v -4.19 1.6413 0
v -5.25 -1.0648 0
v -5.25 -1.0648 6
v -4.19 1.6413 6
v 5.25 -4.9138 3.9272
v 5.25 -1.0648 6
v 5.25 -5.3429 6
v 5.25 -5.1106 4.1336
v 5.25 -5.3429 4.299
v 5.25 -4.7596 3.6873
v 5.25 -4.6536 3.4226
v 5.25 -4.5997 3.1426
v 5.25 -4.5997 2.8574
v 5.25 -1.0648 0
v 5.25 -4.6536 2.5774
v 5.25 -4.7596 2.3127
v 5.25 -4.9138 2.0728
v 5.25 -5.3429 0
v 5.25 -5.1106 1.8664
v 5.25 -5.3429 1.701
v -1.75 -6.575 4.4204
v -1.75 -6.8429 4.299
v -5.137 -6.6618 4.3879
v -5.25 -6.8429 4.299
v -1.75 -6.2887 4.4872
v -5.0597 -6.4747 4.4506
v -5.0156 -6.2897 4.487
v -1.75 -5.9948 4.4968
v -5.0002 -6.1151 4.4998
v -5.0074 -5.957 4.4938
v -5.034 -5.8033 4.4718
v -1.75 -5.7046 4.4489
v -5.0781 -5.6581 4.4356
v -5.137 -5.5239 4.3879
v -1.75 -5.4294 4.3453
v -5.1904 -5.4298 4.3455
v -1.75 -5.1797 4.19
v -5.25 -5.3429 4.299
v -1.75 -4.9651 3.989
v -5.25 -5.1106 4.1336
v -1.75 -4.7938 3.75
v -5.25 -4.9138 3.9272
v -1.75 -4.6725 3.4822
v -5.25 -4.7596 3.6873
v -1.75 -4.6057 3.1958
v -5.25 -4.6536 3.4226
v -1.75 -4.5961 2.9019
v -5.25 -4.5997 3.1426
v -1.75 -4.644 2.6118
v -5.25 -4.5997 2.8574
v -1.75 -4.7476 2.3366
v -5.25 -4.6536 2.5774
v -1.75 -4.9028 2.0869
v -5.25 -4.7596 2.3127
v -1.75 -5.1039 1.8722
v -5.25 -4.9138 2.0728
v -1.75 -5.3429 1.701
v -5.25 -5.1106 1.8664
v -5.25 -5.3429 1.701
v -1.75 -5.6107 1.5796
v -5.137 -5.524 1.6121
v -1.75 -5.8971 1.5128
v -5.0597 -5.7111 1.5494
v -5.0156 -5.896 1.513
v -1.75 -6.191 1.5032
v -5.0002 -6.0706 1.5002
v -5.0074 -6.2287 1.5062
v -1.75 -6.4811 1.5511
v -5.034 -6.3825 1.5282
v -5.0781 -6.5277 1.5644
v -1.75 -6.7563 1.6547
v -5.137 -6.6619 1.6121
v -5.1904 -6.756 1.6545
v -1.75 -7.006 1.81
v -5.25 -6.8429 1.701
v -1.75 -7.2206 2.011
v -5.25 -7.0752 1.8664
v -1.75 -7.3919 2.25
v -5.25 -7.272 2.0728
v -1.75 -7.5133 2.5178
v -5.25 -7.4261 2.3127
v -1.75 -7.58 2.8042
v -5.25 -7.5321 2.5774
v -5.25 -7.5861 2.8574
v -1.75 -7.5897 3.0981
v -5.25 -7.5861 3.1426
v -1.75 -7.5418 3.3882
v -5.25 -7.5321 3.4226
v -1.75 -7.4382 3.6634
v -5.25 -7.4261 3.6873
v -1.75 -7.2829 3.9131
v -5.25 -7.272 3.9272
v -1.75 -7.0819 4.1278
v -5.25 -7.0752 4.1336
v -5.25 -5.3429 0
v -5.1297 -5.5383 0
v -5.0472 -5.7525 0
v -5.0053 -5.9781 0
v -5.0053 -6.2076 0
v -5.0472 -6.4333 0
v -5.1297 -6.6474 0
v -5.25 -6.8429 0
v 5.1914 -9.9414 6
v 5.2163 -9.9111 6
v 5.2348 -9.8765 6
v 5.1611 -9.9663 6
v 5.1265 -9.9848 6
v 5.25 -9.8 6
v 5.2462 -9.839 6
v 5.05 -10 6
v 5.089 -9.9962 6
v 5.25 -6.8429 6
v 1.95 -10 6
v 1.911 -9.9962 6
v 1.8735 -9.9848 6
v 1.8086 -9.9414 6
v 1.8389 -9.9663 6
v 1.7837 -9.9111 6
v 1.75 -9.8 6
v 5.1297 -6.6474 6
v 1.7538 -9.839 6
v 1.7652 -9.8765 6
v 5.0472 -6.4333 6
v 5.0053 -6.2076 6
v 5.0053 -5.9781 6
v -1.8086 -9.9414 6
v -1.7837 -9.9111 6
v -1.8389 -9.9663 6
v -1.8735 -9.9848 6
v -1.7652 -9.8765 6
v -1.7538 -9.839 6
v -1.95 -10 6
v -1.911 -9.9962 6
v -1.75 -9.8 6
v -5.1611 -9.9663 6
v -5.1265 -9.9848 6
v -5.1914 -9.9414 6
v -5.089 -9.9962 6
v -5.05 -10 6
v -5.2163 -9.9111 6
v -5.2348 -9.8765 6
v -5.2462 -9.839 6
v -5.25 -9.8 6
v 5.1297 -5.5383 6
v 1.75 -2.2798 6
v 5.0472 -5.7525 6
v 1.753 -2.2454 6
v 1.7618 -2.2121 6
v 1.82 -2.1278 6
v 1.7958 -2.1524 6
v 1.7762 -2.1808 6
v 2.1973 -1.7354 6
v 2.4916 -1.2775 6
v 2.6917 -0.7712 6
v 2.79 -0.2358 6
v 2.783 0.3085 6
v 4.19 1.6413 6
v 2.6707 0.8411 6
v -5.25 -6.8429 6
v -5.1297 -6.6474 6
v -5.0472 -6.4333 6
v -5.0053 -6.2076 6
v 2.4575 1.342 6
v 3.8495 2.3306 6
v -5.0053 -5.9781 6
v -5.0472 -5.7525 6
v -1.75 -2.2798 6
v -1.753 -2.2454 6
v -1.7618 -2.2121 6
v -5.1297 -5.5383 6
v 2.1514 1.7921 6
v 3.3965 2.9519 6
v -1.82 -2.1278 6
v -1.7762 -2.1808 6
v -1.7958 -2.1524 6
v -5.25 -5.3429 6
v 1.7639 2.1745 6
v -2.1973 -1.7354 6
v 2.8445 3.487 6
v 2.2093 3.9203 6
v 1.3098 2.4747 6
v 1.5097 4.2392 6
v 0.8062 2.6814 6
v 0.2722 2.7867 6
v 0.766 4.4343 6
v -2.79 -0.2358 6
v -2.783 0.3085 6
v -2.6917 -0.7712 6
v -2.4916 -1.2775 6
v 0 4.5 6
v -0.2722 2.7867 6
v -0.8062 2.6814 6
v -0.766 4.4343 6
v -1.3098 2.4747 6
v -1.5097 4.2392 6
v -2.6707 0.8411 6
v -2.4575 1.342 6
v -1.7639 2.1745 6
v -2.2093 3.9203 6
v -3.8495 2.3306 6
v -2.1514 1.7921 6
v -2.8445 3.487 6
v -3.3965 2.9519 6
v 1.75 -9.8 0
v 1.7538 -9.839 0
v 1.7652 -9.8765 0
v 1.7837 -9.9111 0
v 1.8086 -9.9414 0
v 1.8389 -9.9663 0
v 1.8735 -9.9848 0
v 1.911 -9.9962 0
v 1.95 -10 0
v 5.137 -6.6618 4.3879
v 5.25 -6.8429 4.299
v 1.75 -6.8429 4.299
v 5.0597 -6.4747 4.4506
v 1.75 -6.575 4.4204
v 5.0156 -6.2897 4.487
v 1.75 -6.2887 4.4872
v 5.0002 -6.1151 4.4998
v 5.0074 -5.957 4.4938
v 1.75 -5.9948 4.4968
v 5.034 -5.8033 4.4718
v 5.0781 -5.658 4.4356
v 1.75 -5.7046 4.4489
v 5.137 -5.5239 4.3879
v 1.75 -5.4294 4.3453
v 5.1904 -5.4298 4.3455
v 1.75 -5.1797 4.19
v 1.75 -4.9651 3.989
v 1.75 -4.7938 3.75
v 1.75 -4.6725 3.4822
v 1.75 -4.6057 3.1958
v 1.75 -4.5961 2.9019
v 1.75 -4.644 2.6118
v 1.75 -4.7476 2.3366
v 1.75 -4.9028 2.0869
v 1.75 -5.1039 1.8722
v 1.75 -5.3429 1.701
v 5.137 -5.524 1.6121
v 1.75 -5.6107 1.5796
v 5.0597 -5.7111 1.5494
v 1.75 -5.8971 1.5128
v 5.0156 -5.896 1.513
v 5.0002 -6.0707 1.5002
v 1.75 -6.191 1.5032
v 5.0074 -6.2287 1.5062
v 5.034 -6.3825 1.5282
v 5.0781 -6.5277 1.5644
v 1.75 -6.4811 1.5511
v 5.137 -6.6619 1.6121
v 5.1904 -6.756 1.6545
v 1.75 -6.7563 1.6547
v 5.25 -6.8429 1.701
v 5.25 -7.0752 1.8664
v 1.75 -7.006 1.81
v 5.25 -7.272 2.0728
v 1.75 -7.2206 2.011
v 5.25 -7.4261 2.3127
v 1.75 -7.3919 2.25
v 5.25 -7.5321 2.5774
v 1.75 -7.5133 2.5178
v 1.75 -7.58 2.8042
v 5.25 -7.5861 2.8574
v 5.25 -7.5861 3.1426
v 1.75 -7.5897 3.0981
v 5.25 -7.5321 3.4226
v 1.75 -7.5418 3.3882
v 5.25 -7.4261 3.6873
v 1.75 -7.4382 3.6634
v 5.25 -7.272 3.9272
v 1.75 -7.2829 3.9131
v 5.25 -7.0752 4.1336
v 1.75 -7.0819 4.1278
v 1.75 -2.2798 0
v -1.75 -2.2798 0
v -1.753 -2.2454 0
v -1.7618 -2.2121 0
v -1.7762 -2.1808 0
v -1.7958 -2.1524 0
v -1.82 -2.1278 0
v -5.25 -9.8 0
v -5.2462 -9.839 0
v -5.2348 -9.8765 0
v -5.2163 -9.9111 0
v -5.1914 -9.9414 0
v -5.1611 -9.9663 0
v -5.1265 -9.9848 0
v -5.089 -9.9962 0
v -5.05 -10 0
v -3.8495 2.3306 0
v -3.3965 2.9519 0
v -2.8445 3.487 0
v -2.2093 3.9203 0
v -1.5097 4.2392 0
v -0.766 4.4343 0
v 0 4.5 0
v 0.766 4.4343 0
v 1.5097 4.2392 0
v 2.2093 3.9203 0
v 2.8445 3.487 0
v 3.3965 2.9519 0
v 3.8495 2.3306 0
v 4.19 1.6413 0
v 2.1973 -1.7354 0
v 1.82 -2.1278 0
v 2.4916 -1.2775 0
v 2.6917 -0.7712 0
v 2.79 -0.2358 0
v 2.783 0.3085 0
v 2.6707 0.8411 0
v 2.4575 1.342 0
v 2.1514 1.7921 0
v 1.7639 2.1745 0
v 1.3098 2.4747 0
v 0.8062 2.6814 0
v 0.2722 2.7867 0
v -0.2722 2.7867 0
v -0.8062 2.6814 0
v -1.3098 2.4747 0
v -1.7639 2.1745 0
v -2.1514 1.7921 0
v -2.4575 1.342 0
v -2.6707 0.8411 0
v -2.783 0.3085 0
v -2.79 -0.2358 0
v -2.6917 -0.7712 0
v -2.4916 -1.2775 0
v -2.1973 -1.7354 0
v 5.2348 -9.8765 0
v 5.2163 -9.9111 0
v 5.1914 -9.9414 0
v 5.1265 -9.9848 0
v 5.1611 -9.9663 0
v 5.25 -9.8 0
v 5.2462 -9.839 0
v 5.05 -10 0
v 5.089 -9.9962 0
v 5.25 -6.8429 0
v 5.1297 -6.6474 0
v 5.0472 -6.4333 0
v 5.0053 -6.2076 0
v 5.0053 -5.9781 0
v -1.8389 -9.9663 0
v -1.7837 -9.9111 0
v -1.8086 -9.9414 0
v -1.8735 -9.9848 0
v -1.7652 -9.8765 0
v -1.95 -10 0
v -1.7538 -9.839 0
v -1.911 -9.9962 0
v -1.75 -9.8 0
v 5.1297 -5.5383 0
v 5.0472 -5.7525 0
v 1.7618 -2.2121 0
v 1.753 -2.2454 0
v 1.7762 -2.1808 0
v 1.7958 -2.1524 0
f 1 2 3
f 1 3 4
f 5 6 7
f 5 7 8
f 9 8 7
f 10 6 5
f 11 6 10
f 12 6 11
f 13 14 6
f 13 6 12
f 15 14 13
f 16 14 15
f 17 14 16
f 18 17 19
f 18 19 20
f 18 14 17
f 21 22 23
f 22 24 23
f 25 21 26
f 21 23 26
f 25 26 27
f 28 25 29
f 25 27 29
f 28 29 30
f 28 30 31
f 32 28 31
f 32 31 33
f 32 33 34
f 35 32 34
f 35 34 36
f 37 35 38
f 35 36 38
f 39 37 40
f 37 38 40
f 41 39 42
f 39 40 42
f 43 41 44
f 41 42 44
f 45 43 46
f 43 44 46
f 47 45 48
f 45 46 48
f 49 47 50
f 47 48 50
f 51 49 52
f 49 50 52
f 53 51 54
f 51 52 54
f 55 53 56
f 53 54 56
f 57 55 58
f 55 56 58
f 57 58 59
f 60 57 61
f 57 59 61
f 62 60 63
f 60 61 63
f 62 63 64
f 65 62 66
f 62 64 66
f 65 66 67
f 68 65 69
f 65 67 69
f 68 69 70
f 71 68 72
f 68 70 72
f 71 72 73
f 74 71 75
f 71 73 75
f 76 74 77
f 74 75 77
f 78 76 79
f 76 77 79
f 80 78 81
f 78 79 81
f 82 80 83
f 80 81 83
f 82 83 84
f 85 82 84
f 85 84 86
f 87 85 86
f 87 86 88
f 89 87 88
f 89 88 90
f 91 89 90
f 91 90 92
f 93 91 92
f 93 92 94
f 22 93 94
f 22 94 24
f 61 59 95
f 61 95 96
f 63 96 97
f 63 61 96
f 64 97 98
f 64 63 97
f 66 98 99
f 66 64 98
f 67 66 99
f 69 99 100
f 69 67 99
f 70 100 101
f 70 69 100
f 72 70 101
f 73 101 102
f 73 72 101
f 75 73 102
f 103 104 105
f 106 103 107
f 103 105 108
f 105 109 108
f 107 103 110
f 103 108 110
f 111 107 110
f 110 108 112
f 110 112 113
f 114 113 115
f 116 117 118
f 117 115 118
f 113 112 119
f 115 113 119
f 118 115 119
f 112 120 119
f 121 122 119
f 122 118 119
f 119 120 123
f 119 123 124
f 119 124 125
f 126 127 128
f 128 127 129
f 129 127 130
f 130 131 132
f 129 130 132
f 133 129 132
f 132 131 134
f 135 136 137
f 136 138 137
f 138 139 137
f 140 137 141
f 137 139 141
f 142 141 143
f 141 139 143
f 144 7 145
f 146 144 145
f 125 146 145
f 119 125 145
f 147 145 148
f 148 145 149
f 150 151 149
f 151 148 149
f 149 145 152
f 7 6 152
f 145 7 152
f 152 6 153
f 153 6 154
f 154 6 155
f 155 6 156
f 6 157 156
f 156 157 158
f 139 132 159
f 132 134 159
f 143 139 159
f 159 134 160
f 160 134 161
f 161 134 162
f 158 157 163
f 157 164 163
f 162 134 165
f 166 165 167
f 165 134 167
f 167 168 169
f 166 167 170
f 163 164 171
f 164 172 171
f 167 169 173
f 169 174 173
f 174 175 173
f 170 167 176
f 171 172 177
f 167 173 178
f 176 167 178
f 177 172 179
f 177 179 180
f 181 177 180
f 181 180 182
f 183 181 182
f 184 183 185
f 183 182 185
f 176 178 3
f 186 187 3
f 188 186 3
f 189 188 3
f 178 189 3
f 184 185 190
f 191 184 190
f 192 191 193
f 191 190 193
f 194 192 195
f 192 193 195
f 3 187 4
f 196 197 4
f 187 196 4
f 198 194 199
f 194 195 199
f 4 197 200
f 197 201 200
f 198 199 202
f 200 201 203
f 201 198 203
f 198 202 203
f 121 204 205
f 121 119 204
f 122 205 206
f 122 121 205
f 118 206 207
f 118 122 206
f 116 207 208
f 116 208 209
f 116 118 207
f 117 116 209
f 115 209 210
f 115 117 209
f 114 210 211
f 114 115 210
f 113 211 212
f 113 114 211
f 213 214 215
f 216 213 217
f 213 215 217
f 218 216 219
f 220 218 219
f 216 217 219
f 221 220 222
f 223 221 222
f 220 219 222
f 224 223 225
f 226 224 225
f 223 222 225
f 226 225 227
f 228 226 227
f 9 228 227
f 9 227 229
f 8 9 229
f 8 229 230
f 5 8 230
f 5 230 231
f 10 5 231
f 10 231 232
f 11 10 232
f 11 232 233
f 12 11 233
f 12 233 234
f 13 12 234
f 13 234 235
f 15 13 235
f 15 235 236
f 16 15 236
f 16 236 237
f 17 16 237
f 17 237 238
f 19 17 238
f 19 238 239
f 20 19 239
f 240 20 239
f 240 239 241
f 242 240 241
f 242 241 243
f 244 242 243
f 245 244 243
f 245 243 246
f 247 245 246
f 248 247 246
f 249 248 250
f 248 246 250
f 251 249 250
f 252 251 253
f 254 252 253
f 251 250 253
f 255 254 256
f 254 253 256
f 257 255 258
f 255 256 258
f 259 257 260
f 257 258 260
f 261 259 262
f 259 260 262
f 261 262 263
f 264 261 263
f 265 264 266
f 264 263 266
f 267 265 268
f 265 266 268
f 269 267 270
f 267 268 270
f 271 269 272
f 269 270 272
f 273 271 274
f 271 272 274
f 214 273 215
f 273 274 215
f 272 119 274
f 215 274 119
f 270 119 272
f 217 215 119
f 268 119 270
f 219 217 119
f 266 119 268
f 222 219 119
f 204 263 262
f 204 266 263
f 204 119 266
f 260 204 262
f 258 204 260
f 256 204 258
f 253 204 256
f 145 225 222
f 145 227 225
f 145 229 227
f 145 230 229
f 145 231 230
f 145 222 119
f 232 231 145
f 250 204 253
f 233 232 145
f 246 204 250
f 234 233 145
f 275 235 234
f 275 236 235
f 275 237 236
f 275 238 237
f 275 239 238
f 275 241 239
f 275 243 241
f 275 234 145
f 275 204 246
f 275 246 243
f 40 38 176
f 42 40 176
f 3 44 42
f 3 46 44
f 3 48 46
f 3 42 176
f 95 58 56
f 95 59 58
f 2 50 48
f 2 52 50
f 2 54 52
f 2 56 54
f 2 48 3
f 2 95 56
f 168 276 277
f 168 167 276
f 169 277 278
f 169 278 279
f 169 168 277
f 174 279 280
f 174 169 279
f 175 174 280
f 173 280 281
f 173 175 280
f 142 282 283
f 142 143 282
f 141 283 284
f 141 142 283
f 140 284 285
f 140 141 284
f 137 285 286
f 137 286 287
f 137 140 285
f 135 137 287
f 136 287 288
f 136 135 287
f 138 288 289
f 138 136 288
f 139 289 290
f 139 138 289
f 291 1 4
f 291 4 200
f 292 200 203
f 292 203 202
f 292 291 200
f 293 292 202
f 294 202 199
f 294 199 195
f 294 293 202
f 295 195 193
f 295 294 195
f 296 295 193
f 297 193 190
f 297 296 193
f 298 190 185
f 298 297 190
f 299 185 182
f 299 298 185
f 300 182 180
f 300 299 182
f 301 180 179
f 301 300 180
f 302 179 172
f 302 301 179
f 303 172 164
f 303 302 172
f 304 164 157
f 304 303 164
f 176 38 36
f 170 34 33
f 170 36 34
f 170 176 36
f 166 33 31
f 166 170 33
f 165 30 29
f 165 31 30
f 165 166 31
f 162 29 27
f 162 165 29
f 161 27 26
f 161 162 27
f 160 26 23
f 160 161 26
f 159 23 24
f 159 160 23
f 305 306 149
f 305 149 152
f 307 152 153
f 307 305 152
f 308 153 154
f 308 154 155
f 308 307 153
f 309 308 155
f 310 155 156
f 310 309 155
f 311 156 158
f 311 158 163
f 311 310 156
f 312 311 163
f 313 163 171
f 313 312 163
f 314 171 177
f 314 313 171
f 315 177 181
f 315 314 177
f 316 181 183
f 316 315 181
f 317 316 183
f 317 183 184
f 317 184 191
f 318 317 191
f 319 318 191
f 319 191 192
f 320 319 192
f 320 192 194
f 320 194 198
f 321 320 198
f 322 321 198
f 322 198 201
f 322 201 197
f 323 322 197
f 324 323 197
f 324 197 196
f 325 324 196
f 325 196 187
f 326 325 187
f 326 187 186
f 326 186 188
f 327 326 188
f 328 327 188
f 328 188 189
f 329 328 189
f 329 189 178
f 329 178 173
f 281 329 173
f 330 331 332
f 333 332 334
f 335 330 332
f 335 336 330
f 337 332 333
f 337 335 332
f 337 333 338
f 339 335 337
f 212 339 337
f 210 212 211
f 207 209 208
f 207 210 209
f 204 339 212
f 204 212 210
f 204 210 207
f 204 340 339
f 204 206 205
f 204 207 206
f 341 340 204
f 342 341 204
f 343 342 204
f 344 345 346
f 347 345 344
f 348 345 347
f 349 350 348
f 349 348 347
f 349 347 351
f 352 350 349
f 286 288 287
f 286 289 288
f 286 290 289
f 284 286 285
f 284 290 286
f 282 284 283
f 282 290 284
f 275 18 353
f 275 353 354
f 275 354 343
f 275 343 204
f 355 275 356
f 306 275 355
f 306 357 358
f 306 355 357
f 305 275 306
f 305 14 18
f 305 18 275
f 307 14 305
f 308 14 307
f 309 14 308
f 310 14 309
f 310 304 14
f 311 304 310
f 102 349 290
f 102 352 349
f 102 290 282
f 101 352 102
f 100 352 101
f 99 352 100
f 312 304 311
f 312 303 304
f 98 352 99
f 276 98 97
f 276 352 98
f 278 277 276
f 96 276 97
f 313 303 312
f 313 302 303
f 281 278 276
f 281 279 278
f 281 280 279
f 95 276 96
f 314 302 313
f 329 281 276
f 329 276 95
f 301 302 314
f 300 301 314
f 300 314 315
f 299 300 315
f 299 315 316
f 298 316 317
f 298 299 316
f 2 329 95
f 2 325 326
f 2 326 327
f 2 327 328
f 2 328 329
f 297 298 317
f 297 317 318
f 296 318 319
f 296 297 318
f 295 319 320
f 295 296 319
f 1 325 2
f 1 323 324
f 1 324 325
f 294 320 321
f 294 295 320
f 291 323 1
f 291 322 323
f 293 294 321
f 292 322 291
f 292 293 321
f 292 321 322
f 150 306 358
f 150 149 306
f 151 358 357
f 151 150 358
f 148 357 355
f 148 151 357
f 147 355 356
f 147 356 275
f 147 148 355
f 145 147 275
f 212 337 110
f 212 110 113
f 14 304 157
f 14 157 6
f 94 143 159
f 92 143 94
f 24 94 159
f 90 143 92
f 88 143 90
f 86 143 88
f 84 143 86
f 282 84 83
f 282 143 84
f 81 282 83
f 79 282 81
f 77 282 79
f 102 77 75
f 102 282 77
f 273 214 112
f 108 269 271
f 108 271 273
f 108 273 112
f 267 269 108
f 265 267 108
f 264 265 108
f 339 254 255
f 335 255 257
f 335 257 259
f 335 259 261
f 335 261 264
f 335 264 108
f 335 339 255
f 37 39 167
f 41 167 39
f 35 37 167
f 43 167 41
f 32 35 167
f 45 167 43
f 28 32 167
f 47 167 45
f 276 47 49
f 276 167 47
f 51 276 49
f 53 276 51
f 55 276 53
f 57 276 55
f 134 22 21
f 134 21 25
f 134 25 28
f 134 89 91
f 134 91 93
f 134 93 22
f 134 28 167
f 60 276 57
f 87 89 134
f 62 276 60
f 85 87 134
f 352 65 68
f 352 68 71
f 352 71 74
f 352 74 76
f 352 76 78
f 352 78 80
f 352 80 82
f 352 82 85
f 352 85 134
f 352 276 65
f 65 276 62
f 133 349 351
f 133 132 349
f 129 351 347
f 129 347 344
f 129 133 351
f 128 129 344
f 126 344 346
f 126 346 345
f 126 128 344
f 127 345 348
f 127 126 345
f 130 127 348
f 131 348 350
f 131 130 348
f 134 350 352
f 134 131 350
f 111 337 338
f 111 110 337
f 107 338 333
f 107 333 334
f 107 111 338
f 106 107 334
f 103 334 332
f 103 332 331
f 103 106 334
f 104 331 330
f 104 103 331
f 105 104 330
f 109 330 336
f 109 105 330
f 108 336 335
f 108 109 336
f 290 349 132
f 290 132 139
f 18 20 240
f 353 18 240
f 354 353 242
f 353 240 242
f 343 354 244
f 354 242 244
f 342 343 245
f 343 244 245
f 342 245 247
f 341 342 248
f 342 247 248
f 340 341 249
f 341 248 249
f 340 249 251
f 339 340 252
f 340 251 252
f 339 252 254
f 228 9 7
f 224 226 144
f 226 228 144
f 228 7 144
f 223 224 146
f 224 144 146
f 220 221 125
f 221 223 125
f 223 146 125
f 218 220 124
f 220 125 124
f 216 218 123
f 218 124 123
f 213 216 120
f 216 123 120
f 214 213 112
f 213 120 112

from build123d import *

# Parameters (mm, degrees)
EXTRUDE_1_DEPTH     = 6
CUT_EXTRUDE_1_DEPTH = 13.789155562
SKETCH_3_R          = 1.5
CUT_EXTRUDE_3_DEPTH = 16.692354826
FILLET_1_R          = 0.2


with BuildPart() as part:
    # ｽｹｯﾁ1 → ﾎﾞｽ - 押し出し1 (new body)
    with BuildSketch(Plane.XY):
        with BuildLine():
            Line((-5.25, -10), (-5.25, -1.064783644))
            Line((-5.25, -1.064783644), (-4.190017635, 1.641265431))
            ThreePointArc((-4.190017635, 1.641265431), (0, 4.5), (4.190017635, 1.641265431))
            Line((4.190017635, 1.641265431), (5.25, -1.064783644))
            Line((5.25, -1.064783644), (5.25, -10))
            Line((5.25, -10), (1.75, -10))
            Line((1.75, -10), (1.75, -2.185749299))
            ThreePointArc((1.75, -2.185749299), (0, 2.8), (-1.75, -2.185749299))
            Line((-1.75, -2.185749299), (-1.75, -10))
            Line((-1.75, -10), (-5.25, -10))
        make_face()
    extrude(amount=EXTRUDE_1_DEPTH)

    # ｽｹｯﾁ2 → ｶｯﾄ - 押し出し1 (cut, through all)
    with BuildSketch(Plane.XY.offset(6)):
        with BuildLine():
            Line((-5.25, -6.84287465), (-5.25, -5.34287465))
            ThreePointArc((-5.25, -5.34287465), (-5, -6.09287465), (-5.25, -6.84287465))
        make_face()
        with BuildLine():
            Line((5.25, -6.84287465), (5.25, -5.34287465))
            ThreePointArc((5.25, -5.34287465), (5, -6.09287465), (5.25, -6.84287465))
        make_face()
    extrude(amount=-CUT_EXTRUDE_1_DEPTH, mode=Mode.SUBTRACT)

    # ｽｹｯﾁ3 → ｶｯﾄ - 押し出し3 (cut, through all)
    with BuildSketch(Plane.ZY.offset(5.25)):
        with Locations(Location((3, -6.09287465, 0), (0, 0, 330))):
            Circle(SKETCH_3_R)
    extrude(amount=-CUT_EXTRUDE_3_DEPTH, mode=Mode.SUBTRACT)

    # ﾌｨﾚｯﾄ1
    fillet_1_edges = [part.edges().sort_by_distance(p)[0] for p in [
        (1.75, -2.185749299, 3),
        (-1.75, -2.185749299, 3),
        (-1.75, -10, 3),
        (-5.25, -10, 3),
        (5.25, -10, 3),
        (1.75, -10, 3),
    ]]
    fillet(fillet_1_edges, radius=FILLET_1_R)


solid = part.part
